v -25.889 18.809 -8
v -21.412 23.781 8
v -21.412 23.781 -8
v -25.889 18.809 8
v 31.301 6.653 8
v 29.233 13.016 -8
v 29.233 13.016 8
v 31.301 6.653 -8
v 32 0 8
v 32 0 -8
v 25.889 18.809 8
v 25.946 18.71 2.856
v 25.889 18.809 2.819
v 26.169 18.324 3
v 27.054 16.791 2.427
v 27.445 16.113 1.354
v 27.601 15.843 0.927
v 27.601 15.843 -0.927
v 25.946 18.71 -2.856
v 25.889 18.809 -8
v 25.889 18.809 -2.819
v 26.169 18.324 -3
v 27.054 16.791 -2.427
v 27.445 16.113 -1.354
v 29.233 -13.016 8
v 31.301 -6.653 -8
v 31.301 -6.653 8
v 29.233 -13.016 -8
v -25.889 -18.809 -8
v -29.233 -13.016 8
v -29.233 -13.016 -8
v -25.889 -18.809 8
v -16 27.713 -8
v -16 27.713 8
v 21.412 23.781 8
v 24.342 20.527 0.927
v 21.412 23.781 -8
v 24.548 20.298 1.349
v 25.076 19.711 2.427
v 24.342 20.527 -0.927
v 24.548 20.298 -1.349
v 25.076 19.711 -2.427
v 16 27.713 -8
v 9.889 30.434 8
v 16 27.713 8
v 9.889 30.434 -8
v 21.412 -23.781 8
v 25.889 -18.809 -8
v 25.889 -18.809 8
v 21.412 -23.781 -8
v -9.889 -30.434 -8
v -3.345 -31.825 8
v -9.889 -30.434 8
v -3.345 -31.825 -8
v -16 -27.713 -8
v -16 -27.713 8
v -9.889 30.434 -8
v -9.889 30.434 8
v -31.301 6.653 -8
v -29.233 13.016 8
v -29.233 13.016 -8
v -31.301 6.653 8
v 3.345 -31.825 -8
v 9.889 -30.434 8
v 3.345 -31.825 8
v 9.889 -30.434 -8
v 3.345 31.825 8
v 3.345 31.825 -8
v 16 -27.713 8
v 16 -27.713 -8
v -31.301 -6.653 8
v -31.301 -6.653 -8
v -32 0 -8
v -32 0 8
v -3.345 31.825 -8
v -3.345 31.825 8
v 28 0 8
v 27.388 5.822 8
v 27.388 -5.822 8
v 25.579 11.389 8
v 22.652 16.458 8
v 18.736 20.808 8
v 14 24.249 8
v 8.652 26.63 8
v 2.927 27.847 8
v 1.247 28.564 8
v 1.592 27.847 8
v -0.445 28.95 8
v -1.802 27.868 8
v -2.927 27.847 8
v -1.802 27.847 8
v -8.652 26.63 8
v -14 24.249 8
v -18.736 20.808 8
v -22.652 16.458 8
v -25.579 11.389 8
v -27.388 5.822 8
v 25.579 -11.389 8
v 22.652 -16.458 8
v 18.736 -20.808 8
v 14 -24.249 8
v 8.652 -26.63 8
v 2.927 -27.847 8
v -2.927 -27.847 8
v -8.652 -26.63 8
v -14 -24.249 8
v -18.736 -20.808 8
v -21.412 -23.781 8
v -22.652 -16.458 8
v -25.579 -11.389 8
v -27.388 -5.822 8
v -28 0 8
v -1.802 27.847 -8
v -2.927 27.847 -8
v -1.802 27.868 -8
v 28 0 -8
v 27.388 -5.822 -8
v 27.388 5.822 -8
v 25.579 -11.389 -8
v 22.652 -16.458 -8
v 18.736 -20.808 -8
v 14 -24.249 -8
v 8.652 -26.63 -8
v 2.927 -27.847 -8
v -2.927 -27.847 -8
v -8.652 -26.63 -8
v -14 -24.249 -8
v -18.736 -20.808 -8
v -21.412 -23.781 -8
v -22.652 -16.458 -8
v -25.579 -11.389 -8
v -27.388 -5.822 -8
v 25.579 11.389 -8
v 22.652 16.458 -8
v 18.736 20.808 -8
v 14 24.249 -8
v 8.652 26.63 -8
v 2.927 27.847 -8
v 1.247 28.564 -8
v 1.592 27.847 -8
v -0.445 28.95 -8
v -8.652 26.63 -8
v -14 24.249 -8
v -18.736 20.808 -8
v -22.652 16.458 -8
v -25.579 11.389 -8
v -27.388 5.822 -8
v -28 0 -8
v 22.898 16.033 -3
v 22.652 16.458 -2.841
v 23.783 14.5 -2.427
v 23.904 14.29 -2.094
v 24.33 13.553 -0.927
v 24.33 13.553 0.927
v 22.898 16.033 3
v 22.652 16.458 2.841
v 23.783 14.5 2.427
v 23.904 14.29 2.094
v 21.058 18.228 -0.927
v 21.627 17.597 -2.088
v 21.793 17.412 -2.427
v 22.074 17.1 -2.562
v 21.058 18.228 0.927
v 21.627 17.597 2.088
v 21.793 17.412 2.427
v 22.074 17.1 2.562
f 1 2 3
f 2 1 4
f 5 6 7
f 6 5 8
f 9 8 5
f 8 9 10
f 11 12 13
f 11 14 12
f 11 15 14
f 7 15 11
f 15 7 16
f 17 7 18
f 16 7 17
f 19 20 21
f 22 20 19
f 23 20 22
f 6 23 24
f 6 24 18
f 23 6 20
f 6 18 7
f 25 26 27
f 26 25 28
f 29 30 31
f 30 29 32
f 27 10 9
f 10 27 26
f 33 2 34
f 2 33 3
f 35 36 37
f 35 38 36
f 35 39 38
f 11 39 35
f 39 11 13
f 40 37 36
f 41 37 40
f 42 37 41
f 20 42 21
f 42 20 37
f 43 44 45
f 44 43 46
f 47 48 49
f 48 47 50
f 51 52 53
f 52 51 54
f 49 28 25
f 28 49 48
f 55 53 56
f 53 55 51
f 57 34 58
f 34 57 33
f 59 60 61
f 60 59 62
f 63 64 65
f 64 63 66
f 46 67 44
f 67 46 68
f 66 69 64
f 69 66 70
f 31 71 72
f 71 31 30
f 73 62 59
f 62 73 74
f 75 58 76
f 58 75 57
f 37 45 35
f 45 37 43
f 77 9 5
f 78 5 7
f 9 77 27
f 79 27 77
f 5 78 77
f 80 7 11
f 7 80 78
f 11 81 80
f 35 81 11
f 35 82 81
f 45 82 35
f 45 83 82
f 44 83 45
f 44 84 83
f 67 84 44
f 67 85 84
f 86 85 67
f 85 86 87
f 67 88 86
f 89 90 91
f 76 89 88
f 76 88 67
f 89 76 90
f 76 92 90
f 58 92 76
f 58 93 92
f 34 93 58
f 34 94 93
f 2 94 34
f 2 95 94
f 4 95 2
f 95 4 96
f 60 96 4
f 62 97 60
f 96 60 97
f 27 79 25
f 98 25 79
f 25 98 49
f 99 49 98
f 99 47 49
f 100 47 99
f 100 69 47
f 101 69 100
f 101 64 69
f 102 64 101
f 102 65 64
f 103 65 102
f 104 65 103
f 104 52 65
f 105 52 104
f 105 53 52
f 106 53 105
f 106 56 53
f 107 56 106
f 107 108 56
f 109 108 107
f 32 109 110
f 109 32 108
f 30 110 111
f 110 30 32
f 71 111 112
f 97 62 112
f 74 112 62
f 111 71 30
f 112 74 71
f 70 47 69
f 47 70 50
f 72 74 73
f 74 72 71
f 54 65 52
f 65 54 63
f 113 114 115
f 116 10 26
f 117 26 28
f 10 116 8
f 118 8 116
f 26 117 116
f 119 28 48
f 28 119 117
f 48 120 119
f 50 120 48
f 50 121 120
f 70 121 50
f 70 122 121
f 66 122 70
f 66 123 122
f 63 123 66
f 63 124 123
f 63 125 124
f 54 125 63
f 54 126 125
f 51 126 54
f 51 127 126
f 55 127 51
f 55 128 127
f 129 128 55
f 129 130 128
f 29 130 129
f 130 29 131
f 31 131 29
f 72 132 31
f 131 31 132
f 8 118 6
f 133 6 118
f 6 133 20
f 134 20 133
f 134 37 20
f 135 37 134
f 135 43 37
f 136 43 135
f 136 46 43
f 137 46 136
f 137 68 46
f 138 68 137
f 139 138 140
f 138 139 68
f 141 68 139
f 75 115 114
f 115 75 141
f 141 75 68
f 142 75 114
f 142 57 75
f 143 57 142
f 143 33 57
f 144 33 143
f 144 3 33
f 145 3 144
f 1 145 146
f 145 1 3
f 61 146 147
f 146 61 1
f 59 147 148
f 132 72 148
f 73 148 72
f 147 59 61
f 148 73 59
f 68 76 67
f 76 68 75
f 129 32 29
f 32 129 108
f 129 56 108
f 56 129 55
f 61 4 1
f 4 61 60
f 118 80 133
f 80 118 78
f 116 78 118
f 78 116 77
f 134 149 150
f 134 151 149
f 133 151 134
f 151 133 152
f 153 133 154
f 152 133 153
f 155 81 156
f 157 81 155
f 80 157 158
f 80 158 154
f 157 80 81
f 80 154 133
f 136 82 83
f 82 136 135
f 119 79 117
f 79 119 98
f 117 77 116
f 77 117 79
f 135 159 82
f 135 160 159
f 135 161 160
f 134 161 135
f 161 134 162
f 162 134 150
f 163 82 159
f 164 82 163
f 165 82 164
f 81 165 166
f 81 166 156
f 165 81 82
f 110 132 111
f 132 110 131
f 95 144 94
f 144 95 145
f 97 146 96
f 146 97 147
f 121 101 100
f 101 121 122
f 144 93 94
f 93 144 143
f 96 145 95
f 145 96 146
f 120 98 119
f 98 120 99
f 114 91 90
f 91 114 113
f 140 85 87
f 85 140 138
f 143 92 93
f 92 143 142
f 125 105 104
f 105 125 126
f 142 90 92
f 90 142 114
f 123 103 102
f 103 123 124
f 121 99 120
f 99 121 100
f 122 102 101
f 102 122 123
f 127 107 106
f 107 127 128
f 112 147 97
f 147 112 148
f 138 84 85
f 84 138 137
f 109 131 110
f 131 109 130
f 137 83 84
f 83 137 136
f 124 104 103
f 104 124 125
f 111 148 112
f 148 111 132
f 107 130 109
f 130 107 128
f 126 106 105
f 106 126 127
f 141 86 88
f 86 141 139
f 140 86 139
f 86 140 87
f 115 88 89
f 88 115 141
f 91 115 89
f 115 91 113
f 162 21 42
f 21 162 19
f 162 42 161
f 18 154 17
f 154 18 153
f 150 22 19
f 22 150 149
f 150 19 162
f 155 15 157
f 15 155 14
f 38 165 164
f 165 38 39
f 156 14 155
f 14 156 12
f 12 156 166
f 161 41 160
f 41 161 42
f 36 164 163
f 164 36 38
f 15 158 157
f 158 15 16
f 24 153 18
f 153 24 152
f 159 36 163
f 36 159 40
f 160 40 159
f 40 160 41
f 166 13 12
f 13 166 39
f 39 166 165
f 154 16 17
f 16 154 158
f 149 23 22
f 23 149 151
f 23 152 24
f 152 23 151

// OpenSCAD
hole_angle = 35;
difference(){
    cylinder(h=16,r=32,center=true);
    cylinder(h=18,r=28,center=true);
    translate([0,27,0]){
        cylinder(h=18,r=2,center=true);
    }
    translate([30*cos(hole_angle),30*sin(hole_angle),0]){
        rotate([0,90,hole_angle]){
            cylinder(h=8,r=3,center=true);
        }
    }
}
